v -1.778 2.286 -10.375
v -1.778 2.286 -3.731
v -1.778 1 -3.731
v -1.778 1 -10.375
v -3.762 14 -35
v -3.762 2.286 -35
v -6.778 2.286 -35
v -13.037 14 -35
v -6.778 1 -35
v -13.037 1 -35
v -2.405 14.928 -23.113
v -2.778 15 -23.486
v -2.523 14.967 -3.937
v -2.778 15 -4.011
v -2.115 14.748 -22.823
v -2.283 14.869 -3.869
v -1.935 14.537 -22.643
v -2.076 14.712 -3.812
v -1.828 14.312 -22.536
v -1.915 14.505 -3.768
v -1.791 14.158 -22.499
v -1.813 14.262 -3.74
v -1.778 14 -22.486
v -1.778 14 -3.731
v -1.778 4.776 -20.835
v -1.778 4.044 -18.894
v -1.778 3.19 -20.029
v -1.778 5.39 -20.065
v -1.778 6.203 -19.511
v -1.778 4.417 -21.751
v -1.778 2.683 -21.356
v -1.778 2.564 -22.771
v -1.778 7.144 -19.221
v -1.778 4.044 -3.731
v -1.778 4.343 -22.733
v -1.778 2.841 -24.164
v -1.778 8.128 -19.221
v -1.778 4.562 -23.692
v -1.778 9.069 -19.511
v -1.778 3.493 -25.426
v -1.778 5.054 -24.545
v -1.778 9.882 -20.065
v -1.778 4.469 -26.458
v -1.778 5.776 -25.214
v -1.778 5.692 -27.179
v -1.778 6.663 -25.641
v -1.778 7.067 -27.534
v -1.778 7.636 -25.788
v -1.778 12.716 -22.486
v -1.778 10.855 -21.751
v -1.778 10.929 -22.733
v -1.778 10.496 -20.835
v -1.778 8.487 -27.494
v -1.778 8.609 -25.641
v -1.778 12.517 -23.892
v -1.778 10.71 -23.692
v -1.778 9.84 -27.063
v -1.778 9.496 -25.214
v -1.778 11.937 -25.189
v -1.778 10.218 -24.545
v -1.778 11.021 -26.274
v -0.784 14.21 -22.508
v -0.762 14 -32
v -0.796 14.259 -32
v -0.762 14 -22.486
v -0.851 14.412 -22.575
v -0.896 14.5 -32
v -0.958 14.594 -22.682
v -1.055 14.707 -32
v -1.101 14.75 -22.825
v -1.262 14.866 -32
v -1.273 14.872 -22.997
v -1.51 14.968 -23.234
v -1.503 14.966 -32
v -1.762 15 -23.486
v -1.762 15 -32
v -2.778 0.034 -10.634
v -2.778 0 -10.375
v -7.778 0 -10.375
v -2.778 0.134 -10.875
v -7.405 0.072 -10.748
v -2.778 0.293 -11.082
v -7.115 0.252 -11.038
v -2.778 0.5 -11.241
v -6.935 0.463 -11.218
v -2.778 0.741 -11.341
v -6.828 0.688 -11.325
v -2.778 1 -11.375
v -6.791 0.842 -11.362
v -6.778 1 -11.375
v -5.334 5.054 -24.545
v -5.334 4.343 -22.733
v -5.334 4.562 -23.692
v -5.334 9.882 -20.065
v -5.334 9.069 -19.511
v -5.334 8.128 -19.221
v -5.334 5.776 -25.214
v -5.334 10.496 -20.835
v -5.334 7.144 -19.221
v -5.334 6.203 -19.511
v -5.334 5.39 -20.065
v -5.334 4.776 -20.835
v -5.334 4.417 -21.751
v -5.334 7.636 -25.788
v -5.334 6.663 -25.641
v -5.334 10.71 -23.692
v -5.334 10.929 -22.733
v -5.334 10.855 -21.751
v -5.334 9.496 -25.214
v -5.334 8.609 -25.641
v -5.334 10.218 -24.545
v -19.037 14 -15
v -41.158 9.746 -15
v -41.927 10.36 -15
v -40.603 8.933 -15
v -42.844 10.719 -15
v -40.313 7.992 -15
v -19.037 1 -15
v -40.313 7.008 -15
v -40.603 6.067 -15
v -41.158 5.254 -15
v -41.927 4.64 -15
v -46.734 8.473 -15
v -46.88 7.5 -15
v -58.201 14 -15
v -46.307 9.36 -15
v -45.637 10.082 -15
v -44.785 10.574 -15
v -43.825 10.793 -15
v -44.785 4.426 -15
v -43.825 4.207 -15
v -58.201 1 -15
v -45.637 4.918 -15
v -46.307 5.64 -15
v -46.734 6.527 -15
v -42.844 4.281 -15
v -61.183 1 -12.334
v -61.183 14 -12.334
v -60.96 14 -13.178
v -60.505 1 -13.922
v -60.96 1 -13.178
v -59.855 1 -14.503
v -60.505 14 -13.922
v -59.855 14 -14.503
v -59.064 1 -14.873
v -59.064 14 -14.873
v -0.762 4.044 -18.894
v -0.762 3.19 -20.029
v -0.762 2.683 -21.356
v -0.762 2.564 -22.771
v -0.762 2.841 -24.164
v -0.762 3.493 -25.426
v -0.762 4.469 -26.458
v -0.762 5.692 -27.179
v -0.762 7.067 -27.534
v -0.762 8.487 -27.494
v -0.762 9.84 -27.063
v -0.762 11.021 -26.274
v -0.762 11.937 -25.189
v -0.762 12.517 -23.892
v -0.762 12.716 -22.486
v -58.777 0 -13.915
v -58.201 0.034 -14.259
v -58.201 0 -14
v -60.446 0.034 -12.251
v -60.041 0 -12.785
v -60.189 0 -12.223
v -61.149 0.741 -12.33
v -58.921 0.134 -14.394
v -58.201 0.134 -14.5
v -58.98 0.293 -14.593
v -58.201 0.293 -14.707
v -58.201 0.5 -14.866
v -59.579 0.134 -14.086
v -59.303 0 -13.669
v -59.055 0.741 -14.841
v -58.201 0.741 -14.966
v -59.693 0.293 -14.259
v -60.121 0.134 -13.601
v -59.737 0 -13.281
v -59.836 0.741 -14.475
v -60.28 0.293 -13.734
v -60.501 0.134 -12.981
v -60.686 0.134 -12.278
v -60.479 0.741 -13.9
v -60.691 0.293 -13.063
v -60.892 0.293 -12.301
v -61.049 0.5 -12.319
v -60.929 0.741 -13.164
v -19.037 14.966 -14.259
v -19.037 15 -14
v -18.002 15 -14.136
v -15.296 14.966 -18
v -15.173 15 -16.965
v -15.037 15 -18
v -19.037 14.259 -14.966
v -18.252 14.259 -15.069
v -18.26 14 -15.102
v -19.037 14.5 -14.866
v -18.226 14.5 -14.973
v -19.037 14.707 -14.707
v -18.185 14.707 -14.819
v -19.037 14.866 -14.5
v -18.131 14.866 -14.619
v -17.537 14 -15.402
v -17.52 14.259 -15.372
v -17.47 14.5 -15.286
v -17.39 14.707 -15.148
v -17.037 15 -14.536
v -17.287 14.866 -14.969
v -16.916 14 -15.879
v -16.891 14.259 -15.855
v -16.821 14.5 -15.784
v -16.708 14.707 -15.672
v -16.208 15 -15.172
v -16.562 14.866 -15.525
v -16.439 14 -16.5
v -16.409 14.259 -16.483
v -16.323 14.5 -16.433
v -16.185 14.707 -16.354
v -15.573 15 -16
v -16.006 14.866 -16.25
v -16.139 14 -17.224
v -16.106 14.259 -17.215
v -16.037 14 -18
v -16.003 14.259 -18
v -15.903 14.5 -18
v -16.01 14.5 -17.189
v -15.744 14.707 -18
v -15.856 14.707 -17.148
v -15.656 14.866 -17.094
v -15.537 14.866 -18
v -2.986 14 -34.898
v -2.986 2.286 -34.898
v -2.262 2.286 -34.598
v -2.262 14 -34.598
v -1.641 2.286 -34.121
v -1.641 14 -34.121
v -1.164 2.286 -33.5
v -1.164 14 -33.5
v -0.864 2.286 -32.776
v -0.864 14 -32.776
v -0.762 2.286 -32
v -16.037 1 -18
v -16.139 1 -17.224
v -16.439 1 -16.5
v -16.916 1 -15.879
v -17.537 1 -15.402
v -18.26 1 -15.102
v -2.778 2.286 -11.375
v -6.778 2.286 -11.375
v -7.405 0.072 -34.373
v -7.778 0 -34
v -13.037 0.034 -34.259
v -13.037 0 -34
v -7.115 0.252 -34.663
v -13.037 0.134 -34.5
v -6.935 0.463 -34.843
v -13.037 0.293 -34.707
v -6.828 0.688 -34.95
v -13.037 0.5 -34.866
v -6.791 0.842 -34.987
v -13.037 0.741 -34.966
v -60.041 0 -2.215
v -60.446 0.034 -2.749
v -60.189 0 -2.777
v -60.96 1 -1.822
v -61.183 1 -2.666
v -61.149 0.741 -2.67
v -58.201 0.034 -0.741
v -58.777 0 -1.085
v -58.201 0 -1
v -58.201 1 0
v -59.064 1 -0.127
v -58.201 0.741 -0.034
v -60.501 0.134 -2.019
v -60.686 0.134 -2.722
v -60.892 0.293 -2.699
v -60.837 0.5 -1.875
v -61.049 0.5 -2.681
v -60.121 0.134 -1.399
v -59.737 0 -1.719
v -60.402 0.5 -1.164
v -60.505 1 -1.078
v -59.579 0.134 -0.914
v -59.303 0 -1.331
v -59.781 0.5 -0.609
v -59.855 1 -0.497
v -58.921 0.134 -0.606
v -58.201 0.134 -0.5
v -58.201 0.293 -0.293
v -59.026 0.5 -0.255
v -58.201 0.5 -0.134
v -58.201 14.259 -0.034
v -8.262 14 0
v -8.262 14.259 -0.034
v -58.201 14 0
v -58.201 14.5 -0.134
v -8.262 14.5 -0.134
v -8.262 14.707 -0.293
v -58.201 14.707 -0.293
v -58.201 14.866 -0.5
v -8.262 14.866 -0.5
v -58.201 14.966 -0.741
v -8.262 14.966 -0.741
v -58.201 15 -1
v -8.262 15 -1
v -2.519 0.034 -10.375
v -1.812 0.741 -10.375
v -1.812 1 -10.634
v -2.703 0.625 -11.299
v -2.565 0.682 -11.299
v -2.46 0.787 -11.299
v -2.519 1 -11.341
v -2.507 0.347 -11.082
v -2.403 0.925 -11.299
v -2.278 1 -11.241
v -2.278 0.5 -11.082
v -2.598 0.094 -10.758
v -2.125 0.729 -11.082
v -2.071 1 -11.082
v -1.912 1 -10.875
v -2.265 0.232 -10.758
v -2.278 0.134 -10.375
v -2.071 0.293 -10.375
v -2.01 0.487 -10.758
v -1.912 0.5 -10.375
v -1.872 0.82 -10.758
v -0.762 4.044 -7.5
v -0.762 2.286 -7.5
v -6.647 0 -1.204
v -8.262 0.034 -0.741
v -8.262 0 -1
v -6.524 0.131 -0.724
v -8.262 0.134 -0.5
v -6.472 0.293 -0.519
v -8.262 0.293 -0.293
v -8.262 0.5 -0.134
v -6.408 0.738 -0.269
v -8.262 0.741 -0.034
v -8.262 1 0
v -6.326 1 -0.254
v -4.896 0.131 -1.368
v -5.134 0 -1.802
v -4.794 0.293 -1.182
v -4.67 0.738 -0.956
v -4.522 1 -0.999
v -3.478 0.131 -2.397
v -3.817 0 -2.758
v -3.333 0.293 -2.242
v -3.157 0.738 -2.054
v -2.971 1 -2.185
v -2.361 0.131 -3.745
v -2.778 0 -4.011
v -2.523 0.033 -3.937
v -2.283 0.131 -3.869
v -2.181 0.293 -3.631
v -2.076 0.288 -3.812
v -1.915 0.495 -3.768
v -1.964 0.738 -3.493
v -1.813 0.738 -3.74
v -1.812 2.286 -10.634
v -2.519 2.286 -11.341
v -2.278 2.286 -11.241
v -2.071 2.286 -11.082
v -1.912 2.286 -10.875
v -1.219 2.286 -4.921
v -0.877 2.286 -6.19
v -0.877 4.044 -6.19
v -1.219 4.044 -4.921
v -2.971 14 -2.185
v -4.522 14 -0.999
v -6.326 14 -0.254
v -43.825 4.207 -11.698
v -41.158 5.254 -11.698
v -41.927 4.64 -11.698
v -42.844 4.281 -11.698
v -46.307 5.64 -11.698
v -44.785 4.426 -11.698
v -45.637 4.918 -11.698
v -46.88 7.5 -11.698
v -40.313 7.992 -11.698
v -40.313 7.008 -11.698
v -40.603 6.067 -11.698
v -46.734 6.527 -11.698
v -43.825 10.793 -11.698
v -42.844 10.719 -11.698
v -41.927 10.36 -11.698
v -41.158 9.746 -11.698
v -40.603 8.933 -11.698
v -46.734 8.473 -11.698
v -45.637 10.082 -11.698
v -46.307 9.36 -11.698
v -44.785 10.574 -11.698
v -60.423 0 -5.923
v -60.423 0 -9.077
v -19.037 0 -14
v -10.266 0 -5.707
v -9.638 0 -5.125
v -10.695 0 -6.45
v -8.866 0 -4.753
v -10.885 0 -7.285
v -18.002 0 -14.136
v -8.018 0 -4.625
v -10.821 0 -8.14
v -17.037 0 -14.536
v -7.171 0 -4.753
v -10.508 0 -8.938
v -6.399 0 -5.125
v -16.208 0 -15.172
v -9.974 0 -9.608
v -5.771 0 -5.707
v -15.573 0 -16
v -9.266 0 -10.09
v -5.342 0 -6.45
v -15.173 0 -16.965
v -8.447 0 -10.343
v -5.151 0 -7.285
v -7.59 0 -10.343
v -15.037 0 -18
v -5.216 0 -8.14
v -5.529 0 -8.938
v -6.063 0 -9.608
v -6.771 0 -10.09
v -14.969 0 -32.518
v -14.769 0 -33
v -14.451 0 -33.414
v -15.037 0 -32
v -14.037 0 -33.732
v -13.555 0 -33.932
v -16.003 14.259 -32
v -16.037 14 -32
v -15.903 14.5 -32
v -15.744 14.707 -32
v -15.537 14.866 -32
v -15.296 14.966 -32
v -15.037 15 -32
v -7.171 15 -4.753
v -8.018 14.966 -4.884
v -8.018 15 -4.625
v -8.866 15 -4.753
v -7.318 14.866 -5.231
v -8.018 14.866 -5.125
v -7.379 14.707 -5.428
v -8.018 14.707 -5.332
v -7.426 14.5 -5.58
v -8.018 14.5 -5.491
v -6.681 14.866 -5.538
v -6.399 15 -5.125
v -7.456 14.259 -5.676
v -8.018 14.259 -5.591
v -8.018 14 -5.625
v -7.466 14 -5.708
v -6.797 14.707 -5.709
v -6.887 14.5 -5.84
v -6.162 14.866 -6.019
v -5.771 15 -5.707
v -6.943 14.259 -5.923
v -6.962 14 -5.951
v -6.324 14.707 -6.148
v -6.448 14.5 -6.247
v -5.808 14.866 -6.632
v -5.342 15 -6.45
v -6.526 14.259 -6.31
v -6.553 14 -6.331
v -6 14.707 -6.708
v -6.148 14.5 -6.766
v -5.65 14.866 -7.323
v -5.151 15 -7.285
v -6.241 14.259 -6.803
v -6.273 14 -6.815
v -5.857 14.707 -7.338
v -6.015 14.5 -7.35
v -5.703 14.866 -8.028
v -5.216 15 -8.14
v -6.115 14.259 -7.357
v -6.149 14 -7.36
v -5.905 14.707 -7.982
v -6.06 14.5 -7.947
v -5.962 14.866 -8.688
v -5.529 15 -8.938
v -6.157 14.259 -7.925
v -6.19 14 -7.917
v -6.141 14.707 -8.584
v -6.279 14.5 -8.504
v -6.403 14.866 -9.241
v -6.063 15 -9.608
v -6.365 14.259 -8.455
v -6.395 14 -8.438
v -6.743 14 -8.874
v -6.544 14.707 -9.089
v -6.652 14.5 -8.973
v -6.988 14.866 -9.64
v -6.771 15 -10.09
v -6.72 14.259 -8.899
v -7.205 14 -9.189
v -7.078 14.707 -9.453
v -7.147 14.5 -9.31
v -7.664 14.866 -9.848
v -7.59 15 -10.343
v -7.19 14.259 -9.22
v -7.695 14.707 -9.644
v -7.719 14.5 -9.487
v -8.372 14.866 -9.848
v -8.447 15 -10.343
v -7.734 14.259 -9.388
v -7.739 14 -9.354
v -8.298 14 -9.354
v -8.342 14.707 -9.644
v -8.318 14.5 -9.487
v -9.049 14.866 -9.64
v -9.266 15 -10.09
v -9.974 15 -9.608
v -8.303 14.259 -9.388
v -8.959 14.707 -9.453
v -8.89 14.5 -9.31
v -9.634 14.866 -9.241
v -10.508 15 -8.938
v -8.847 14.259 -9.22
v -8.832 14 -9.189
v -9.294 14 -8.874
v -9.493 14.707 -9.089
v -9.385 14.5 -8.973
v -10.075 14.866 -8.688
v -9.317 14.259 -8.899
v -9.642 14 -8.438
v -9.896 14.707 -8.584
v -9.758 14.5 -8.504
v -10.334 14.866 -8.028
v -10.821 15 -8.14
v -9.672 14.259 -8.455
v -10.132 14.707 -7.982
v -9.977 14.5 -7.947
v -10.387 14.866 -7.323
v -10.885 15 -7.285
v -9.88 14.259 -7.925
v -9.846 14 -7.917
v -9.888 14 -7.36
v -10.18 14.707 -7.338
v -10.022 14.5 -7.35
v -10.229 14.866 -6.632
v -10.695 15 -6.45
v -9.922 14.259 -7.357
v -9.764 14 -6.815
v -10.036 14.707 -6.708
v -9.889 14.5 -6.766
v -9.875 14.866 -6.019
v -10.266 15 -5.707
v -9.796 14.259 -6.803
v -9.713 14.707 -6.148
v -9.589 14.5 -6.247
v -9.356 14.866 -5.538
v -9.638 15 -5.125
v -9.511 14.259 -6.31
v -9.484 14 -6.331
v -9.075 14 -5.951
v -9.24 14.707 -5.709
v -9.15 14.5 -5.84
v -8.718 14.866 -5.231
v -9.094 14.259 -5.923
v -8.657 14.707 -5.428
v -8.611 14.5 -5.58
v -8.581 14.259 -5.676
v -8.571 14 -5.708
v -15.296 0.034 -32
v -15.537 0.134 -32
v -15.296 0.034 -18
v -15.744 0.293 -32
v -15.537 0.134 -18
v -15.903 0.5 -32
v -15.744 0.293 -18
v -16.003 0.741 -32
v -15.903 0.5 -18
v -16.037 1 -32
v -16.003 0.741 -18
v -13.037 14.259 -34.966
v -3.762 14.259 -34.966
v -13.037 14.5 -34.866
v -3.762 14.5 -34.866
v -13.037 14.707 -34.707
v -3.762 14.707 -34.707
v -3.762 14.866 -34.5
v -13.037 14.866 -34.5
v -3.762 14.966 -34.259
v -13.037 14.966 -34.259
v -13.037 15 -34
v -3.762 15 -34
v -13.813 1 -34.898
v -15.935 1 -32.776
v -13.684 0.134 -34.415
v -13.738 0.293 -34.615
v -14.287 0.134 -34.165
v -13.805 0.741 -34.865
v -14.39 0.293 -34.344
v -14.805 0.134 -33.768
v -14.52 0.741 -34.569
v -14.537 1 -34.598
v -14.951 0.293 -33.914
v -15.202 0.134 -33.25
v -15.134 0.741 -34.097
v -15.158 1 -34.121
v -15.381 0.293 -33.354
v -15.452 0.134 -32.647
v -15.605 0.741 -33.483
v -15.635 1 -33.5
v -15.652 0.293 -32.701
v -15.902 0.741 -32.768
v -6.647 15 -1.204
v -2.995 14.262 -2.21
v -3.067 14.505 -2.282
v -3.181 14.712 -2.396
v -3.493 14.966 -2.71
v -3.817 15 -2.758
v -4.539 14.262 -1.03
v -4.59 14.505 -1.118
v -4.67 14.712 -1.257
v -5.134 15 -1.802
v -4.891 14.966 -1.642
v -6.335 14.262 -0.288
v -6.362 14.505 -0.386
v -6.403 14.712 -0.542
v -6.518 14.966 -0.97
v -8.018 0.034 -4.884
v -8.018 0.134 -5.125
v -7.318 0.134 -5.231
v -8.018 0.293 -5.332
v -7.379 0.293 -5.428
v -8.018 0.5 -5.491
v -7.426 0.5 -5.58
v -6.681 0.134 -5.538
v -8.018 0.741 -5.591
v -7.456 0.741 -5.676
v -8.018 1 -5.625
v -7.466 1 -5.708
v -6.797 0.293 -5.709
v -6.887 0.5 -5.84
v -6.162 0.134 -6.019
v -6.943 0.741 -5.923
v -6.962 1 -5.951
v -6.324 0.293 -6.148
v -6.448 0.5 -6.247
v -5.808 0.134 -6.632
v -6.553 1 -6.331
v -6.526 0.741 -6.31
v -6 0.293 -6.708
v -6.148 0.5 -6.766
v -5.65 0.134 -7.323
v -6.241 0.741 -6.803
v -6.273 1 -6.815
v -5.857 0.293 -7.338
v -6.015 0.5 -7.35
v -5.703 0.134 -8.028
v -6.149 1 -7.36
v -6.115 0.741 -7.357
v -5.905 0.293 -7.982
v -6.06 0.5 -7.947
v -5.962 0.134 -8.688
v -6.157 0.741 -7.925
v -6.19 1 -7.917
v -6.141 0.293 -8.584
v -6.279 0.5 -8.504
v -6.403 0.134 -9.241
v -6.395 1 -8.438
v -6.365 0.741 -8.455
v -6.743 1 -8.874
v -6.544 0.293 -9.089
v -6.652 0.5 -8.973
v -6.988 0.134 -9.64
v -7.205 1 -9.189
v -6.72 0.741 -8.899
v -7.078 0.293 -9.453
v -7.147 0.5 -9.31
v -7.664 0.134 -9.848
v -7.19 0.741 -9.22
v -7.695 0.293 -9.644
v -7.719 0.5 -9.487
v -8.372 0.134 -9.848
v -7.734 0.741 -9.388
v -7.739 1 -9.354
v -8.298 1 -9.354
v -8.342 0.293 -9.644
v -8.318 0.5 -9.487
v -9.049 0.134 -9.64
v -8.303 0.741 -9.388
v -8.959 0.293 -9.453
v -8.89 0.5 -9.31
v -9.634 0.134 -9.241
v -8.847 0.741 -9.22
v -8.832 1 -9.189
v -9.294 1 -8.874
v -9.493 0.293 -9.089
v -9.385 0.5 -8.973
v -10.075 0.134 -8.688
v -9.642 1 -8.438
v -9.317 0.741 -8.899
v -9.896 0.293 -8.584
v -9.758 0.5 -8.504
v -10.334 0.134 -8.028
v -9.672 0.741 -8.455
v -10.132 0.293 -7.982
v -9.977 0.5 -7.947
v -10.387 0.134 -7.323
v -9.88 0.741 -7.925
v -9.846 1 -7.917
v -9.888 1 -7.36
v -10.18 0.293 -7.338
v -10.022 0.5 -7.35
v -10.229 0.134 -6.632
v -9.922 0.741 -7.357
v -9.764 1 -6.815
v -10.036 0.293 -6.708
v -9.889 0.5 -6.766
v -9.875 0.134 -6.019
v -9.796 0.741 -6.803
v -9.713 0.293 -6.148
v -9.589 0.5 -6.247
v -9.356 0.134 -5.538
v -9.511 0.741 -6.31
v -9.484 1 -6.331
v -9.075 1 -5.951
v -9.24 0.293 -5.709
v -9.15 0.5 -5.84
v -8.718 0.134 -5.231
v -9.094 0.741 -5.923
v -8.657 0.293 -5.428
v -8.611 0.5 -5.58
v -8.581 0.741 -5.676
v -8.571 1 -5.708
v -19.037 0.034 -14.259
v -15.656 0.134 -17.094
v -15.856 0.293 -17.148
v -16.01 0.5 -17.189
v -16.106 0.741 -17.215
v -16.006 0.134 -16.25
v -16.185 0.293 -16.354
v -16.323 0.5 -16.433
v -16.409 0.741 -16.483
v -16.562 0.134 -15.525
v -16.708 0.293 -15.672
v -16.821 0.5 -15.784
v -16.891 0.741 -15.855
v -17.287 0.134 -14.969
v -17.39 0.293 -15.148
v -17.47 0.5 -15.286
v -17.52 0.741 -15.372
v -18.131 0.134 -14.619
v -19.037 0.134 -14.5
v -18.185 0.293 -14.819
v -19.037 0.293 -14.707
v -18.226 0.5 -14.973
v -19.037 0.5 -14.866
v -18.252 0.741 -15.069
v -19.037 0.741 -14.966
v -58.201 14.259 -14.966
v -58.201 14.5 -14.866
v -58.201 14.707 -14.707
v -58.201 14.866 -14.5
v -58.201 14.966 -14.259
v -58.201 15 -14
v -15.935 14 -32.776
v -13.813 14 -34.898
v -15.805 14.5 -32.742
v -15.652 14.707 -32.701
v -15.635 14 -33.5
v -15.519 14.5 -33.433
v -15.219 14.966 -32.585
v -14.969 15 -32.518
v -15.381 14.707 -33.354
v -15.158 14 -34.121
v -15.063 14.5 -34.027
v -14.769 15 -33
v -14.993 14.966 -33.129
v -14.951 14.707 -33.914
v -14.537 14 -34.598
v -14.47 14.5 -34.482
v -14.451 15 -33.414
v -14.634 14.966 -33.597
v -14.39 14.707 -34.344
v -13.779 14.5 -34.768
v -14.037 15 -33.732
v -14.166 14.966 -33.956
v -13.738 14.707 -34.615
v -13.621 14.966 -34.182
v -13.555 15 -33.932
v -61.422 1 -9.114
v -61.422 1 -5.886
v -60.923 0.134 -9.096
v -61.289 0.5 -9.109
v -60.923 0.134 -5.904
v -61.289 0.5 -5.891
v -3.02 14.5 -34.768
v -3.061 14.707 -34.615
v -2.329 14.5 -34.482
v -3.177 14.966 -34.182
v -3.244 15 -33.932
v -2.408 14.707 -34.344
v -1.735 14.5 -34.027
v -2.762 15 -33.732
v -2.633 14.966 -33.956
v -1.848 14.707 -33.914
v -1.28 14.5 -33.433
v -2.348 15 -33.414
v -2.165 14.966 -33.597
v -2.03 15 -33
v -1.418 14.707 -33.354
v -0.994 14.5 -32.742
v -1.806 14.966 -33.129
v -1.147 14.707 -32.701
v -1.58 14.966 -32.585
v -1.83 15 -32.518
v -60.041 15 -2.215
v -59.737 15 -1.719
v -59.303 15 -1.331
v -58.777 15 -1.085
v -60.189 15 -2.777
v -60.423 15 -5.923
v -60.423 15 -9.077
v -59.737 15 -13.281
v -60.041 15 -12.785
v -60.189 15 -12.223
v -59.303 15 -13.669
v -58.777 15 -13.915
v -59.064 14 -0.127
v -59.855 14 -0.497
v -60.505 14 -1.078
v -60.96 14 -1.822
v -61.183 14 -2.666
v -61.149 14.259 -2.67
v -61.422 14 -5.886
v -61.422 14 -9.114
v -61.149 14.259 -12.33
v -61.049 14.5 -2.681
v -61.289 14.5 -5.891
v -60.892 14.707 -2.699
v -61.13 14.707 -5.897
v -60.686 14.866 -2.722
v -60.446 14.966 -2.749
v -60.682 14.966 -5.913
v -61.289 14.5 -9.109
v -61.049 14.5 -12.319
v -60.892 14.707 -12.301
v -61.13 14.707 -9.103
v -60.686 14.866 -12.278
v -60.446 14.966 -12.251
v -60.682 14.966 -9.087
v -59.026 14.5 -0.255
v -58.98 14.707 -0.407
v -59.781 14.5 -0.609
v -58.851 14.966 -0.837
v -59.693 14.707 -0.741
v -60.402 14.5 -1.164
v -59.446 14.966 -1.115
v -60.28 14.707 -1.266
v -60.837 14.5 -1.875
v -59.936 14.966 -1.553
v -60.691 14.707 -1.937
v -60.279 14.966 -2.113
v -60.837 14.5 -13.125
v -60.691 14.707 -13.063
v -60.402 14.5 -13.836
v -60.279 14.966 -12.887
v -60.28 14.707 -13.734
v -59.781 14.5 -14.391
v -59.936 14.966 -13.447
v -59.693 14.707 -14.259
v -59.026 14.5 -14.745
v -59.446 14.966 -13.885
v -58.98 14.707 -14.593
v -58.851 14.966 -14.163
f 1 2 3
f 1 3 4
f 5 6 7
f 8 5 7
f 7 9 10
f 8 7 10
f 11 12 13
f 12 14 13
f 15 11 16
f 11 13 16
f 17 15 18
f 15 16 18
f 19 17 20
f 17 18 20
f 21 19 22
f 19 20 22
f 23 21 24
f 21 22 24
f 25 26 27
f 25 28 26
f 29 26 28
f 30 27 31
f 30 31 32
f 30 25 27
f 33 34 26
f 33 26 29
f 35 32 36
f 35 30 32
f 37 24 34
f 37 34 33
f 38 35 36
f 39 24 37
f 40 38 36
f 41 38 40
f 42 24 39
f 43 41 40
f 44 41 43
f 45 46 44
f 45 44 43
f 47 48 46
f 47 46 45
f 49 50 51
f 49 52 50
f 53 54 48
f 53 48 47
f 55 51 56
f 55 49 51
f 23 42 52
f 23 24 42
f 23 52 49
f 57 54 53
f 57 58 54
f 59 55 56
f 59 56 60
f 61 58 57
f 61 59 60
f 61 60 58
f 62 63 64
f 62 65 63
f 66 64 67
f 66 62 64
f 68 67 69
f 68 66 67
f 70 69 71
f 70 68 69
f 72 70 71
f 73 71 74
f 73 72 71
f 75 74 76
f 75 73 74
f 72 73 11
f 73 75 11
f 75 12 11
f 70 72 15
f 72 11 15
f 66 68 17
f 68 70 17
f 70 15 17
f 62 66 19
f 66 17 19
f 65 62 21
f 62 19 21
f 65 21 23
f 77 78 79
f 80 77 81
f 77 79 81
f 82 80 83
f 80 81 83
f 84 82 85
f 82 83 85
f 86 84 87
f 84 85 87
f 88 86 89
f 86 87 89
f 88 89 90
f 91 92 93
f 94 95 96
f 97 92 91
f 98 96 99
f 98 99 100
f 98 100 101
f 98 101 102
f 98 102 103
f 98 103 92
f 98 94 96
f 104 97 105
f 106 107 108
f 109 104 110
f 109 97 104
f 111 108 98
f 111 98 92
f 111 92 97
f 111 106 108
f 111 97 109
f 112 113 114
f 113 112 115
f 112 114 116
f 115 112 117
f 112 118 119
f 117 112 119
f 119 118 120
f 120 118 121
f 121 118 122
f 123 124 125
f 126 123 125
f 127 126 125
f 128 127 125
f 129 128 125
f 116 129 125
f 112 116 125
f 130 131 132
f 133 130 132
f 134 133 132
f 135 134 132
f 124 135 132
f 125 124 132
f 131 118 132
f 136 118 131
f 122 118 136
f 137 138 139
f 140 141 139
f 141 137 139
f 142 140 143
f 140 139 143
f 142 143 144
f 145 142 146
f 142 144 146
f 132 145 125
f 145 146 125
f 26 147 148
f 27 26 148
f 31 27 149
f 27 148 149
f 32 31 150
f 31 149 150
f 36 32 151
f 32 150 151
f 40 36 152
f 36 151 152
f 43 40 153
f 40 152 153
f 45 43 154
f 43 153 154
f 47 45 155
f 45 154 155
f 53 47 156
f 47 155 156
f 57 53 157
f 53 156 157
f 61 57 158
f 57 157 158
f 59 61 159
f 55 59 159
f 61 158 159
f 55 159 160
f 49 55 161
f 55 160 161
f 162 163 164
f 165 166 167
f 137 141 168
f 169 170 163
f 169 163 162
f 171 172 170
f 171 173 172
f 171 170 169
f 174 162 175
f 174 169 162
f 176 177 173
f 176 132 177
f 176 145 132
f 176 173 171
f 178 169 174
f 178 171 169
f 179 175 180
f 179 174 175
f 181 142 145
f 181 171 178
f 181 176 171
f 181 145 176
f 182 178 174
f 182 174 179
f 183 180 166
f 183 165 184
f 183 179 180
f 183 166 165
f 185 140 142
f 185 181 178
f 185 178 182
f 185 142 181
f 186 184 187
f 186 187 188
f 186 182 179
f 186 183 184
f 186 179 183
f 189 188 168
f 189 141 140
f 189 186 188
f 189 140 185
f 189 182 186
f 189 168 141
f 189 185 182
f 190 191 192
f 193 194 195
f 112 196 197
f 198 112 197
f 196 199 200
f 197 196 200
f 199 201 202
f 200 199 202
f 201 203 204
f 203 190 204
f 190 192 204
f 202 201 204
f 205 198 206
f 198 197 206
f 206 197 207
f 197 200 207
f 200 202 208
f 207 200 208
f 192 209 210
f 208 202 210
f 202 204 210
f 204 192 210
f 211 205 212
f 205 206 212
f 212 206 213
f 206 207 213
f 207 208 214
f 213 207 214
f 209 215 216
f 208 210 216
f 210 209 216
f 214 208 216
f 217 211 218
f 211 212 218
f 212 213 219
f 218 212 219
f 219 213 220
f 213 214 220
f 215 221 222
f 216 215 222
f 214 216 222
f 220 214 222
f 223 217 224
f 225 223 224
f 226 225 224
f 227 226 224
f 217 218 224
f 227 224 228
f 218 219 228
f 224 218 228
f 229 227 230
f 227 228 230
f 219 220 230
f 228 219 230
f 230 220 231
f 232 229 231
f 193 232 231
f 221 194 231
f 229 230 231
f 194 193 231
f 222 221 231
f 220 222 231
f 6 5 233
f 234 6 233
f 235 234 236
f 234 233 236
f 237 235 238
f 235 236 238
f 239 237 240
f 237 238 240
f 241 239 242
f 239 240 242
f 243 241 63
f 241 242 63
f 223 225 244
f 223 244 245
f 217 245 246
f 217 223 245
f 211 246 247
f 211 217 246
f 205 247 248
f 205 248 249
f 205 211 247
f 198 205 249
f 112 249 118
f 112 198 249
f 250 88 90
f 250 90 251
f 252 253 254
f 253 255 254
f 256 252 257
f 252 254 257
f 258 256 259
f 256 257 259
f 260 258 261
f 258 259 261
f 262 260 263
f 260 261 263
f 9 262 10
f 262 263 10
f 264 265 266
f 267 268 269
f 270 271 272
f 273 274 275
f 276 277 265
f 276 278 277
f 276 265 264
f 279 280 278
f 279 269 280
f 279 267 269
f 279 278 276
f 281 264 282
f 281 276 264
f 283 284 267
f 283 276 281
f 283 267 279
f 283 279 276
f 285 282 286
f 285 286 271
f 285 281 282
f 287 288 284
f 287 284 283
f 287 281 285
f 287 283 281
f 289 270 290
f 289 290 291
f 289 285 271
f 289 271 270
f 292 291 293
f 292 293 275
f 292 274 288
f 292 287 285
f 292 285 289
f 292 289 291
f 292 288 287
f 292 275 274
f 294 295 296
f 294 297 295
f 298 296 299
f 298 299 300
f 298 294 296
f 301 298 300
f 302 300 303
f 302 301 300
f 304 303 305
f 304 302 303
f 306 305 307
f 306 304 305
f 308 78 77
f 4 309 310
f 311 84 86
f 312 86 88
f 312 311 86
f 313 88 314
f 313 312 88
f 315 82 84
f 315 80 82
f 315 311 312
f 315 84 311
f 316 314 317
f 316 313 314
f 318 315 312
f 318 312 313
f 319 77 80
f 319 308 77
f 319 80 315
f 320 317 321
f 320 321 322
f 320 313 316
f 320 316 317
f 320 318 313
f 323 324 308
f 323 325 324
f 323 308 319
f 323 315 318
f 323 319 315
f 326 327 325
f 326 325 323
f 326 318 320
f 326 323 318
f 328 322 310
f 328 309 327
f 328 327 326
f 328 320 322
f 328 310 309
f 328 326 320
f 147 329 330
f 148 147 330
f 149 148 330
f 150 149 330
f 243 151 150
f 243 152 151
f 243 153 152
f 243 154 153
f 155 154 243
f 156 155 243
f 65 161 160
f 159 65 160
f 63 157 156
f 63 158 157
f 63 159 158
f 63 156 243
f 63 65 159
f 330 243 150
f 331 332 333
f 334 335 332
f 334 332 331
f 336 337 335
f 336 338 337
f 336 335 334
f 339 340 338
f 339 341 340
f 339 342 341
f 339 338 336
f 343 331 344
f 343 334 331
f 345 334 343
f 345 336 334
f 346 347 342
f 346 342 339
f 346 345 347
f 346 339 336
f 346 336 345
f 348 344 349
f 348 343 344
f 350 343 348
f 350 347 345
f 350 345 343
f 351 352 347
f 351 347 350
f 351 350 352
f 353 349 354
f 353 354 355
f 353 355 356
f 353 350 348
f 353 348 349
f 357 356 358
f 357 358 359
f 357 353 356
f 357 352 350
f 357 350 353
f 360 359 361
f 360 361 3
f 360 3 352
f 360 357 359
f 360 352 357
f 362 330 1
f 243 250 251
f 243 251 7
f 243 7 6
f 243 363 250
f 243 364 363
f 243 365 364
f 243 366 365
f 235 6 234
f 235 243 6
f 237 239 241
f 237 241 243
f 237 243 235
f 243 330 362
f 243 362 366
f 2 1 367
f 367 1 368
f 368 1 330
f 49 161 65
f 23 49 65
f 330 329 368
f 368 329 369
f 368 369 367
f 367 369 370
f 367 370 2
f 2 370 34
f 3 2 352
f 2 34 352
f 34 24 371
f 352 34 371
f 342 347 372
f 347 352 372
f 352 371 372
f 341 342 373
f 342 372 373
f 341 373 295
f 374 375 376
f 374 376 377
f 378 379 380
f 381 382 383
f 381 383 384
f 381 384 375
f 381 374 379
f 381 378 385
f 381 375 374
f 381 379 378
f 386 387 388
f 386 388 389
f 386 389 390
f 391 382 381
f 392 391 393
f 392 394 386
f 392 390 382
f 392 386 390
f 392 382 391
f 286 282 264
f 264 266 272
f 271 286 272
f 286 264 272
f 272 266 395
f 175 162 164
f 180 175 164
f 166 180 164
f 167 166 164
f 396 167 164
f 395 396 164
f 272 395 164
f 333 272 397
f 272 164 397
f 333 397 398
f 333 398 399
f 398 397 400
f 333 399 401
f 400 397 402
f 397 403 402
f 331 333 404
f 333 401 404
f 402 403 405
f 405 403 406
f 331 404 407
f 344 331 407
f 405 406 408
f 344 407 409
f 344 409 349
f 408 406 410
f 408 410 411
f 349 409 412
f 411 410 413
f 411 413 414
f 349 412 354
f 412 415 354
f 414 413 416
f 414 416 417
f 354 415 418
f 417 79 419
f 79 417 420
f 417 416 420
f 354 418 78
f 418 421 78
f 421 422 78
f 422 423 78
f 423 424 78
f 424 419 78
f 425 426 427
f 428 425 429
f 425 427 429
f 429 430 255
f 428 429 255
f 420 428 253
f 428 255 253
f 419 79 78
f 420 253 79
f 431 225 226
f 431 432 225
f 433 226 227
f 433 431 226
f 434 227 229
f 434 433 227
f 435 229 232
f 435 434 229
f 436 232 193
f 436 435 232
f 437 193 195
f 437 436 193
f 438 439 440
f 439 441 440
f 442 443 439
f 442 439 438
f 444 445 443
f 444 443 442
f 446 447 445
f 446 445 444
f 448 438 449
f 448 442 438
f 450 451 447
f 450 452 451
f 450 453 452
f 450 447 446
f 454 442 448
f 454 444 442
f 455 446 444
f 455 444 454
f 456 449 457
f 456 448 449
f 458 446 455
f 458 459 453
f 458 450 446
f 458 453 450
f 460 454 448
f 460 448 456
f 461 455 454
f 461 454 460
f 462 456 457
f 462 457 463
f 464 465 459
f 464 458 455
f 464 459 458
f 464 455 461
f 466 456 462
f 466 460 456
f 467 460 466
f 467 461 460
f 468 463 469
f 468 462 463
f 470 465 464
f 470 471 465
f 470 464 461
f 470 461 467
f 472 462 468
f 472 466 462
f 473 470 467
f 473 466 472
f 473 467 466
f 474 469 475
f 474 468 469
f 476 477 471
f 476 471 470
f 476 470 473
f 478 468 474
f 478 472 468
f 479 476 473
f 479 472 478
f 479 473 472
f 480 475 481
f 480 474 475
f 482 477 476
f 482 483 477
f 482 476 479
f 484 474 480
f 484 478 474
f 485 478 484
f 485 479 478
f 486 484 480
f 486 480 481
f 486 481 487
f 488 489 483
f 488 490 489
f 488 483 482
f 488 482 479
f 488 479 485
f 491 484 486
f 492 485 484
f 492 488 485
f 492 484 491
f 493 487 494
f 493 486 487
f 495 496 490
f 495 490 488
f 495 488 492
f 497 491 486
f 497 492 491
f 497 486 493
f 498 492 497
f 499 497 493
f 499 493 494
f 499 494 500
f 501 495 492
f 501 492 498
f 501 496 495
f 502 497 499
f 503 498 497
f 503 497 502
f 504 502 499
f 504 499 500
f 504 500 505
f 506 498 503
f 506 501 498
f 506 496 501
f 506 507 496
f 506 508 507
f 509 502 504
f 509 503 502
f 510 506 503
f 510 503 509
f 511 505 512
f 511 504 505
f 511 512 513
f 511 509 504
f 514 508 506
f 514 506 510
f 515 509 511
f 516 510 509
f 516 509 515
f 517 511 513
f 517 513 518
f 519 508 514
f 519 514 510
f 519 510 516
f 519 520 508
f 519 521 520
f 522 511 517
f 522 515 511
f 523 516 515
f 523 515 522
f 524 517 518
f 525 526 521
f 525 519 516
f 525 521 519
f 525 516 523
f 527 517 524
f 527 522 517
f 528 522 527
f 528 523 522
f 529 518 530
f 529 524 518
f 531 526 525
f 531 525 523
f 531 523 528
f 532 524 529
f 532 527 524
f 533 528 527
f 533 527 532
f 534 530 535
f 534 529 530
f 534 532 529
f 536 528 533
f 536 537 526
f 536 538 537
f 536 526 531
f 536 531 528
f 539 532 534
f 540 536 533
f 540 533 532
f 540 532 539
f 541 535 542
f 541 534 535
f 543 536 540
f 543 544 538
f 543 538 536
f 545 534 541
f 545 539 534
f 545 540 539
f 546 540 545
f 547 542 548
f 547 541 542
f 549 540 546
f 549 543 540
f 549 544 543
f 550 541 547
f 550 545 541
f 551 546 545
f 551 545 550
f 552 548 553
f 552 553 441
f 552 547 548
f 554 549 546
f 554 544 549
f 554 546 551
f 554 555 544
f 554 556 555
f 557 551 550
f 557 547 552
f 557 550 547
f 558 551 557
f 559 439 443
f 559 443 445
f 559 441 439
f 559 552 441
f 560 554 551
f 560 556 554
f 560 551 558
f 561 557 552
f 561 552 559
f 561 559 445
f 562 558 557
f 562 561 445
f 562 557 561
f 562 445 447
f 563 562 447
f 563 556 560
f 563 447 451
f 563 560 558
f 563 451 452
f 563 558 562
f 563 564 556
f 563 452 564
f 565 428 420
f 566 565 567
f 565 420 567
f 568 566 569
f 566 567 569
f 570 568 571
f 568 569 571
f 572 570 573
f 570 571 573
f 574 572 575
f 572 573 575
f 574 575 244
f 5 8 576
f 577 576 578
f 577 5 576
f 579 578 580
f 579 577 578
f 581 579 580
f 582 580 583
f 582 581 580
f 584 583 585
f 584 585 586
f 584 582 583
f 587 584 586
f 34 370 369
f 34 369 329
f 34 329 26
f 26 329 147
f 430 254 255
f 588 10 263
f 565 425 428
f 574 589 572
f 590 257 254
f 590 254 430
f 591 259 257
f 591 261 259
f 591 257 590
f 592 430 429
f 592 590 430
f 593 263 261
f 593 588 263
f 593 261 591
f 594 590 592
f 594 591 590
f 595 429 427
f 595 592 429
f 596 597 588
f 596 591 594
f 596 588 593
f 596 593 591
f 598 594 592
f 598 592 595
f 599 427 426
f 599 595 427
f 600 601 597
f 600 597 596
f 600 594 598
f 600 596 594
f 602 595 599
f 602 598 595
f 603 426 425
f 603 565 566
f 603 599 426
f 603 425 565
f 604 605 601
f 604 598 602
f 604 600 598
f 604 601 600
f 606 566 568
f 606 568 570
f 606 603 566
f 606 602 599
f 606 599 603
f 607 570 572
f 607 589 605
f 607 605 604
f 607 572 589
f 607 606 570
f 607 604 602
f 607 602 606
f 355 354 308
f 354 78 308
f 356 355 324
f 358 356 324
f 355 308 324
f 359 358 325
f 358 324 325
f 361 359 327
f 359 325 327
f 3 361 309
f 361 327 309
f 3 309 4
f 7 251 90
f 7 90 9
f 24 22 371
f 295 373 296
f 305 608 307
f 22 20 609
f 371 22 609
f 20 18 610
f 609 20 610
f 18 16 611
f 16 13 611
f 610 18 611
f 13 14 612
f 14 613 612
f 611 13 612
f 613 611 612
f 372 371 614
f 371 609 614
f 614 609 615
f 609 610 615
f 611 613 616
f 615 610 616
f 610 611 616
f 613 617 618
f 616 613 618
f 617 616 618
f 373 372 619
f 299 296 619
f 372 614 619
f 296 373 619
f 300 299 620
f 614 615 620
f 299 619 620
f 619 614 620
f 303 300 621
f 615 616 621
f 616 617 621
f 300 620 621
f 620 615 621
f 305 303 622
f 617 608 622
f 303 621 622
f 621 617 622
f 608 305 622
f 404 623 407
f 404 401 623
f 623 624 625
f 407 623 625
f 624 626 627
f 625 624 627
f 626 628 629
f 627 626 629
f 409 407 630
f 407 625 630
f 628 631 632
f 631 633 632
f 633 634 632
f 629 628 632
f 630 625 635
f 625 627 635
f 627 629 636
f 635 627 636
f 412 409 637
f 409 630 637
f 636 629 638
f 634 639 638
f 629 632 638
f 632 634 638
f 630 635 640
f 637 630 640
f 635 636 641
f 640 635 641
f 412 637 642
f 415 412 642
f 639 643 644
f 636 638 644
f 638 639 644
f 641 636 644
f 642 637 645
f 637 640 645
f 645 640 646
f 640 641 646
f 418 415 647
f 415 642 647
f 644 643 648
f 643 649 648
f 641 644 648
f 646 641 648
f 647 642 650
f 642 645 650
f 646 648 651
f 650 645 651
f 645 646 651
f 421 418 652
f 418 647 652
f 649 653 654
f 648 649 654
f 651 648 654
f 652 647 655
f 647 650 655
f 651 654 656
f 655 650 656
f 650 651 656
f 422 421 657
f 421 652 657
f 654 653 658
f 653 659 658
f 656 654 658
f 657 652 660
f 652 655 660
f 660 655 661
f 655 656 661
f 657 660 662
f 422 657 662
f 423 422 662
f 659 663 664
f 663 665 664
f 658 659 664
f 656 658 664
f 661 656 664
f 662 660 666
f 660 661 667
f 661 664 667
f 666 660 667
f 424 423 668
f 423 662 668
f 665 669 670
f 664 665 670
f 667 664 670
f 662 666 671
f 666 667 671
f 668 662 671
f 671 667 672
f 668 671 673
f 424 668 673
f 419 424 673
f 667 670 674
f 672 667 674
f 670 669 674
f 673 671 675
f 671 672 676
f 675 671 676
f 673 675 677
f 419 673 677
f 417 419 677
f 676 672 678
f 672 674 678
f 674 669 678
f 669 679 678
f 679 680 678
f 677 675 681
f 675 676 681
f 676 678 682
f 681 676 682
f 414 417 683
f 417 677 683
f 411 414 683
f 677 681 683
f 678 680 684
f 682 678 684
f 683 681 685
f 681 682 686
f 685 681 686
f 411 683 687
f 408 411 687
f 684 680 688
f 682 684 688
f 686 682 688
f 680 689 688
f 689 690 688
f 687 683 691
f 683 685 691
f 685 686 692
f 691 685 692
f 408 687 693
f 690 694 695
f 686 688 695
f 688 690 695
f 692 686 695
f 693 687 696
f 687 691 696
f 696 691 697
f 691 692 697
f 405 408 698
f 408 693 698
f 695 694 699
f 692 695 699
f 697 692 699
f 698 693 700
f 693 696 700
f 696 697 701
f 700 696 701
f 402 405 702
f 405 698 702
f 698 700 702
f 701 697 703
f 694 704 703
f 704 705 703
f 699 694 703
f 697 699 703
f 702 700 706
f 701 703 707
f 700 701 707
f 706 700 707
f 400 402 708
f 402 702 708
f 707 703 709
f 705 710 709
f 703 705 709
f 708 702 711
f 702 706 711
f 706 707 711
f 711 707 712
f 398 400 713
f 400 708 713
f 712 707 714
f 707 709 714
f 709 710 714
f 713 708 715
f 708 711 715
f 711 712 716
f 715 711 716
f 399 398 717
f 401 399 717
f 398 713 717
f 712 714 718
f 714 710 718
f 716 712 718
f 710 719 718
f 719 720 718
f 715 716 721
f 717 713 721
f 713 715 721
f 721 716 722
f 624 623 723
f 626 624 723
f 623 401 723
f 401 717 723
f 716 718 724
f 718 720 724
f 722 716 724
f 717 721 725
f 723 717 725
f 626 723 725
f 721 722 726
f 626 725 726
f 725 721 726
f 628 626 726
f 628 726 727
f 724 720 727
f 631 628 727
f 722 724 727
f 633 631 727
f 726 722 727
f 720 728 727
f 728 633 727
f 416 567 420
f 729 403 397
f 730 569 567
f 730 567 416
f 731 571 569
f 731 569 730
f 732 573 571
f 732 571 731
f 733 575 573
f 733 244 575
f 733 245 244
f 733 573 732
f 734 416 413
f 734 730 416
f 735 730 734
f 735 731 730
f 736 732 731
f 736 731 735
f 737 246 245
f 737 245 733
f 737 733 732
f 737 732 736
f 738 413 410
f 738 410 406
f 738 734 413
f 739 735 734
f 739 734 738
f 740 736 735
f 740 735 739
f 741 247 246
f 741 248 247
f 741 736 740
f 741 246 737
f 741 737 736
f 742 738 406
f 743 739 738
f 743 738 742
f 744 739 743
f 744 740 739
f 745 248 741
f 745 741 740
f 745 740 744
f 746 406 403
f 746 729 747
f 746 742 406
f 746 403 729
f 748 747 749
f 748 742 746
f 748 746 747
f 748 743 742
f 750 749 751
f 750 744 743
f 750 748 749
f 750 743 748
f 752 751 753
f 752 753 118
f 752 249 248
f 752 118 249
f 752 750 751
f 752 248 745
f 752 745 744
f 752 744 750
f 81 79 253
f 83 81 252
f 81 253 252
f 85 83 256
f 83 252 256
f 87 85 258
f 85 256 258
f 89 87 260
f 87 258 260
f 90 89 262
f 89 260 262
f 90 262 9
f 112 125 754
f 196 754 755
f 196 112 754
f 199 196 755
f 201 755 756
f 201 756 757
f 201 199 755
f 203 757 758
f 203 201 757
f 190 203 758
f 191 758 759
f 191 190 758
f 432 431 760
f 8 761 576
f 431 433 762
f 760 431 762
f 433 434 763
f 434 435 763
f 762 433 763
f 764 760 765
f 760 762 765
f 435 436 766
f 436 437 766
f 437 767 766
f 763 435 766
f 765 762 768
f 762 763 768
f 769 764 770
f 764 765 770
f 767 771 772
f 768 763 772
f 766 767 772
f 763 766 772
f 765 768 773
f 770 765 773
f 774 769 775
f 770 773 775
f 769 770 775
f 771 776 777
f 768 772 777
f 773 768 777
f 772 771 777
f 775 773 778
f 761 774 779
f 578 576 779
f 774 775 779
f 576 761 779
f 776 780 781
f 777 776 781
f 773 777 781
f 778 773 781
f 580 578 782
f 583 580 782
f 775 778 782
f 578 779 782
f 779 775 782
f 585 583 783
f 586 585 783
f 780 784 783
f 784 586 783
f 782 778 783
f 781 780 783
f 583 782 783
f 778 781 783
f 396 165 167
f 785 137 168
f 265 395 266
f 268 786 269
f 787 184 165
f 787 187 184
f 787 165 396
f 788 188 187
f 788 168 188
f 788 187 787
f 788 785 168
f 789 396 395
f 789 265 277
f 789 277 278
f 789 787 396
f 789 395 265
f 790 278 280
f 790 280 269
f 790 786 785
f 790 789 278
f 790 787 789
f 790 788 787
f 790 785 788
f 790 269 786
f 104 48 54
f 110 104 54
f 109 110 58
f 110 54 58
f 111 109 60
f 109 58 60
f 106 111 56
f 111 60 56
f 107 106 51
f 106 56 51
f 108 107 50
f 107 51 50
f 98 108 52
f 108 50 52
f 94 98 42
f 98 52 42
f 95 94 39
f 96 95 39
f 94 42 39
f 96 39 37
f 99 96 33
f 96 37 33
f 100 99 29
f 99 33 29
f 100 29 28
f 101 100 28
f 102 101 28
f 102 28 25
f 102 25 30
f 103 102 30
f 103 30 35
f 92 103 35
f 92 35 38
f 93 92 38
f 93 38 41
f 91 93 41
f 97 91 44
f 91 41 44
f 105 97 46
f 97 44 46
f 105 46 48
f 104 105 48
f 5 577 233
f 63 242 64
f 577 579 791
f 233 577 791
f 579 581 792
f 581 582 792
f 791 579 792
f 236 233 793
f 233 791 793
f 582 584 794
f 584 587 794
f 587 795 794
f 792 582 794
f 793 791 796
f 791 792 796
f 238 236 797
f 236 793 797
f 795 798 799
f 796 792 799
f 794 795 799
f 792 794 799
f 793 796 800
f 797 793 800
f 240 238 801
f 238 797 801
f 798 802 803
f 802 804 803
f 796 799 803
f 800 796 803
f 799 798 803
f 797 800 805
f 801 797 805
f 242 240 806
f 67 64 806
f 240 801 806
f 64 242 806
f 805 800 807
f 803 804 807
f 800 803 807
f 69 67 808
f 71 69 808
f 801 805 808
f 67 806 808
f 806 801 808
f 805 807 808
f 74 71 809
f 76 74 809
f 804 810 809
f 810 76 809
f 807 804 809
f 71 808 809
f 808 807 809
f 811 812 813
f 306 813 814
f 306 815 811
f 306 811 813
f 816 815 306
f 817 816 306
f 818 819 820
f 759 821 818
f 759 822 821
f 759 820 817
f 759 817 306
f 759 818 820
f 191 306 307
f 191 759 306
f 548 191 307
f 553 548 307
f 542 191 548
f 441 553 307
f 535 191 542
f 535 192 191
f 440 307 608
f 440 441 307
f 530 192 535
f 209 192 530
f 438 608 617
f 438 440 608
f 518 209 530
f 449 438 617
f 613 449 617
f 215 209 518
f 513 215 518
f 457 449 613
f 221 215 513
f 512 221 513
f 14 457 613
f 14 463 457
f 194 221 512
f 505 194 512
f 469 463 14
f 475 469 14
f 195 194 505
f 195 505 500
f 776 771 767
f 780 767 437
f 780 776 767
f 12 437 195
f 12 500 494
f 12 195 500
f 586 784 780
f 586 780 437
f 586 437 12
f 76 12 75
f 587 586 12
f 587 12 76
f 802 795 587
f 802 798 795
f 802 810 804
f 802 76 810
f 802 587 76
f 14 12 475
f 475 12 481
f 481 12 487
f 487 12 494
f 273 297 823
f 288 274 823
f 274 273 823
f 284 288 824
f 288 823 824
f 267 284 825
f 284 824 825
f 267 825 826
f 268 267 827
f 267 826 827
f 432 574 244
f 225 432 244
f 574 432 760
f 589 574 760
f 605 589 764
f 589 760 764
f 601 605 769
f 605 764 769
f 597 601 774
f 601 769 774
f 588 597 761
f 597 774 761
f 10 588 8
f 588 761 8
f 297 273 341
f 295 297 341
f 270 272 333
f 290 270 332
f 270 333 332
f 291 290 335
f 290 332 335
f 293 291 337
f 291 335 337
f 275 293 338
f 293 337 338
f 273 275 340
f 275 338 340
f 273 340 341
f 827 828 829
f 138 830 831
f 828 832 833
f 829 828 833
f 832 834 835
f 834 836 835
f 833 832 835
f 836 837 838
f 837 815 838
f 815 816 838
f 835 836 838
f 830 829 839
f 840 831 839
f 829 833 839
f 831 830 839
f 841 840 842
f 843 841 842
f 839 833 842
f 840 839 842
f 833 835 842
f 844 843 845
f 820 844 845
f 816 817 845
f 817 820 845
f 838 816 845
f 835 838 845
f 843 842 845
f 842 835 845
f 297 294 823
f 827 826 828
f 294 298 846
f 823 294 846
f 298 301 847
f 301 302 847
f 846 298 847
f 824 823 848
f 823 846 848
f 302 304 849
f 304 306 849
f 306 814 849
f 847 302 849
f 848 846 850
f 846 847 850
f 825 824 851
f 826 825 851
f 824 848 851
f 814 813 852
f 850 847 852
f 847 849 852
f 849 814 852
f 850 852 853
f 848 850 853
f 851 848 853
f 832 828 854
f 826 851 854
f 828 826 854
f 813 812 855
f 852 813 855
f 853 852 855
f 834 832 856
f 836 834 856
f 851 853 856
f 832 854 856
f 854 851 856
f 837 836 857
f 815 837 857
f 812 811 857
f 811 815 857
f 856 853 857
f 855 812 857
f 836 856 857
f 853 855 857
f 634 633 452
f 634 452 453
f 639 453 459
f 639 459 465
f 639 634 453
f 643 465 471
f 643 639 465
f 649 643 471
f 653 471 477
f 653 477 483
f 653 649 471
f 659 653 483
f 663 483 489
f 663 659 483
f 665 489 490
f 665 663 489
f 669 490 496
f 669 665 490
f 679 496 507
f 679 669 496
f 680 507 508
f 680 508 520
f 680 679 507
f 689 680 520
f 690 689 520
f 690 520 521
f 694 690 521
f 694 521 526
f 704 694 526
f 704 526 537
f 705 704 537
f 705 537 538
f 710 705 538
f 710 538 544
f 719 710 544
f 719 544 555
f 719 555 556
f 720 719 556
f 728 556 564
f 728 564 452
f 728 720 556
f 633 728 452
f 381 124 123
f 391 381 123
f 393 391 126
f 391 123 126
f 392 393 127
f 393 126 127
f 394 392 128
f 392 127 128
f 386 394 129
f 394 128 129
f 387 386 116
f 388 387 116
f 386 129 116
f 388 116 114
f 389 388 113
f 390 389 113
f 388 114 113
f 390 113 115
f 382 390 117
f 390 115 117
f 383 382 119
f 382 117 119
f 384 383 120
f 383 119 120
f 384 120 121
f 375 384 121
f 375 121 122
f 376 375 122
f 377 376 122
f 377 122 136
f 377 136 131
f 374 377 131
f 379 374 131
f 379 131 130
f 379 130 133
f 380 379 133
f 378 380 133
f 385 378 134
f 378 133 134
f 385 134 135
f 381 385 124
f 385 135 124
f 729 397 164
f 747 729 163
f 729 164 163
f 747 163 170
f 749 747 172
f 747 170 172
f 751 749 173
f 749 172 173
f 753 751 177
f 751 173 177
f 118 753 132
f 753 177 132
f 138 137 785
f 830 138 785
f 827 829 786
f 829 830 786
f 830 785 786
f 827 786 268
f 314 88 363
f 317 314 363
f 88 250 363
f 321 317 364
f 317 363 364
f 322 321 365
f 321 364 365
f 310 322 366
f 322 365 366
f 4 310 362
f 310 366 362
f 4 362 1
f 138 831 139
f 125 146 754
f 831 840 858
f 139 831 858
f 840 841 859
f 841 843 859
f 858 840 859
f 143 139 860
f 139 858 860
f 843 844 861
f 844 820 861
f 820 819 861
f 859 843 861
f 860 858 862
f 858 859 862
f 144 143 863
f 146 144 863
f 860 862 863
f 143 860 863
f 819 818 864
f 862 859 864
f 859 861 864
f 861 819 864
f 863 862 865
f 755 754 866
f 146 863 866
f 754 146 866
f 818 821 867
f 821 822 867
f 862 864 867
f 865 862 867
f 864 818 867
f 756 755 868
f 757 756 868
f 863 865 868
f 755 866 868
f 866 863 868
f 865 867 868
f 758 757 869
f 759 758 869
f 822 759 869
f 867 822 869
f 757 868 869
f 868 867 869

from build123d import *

# Parameters (mm, degrees)
SKETCH1_R           = 1.875
BOSS_EXTRUDE1_DEPTH = 15
SKETCH2_W           = 35
SKETCH2_H           = 2.286
CUT_EXTRUDE1_DEPTH  = 1.778
SKETCH7_W           = 23.625
SKETCH7_H           = 2.286
CUT_EXTRUDE6_DEPTH  = 5
SKETCH3_R           = 3.302
CUT_EXTRUDE2_DEPTH  = 3.556
SKETCH4_R           = 3.302
CUT_EXTRUDE3_DEPTH  = 3.302
SKETCH5_W           = 35
SKETCH5_H           = 15
CUT_EXTRUDE4_DEPTH  = 0.762
CUT_EXTRUDE5_DEPTH  = 73.293856534
FILLET1_R           = 3
FILLET2_R           = 1


with BuildPart() as part:
    # Sketch1 → Boss-Extrude1 (new body)
    with BuildSketch(Plane(origin=(0, 0, 0), x_dir=(1, 0, 0), z_dir=(0, 1, 0))):
        with BuildLine():
            Line((-60.8, 0), (0, 0))
            Line((0, 0), (0, 35))
            Line((0, 35), (-16.036868781, 35))
            Line((-16.036868781, 35), (-16.036868781, 15))
            Line((-16.036868781, 15), (-60.8, 15))
            ThreePointArc((-60.8, 15), (-61.45243439, 7.5), (-60.8, 0))
        make_face()
        with Locations(Location((-8.01843439, 7.5, 0), (0, 0, 270))):
            Circle(SKETCH1_R, mode=Mode.SUBTRACT)
    extrude(amount=BOSS_EXTRUDE1_DEPTH)

    # Sketch2 → Cut-Extrude1 (cut)
    with BuildSketch(Plane(origin=(0, 0, 0), x_dir=(0, 0, -1), z_dir=(1, 0, 0))):
        with BuildLine():
            Line((22.486, 12.716), (22.486, 15))
            Line((22.486, 15), (0, 15))
            Line((0, 15), (0, 4.043897552))
            Line((0, 4.043897552), (18.893897552, 4.043897552))
            ThreePointArc((18.893897552, 4.043897552), (27.179308025, 5.691968164), (22.486, 12.716))
        make_face()
        with Locations((17.5, 1.143)):
            Rectangle(SKETCH2_W, SKETCH2_H)
    extrude(amount=-CUT_EXTRUDE1_DEPTH, mode=Mode.SUBTRACT)

    # Sketch7 → Cut-Extrude6 (cut)
    with BuildSketch(Plane(origin=(-1.778, 0, 0), x_dir=(0, 0, -1), z_dir=(1, 0, 0))):
        with Locations((23.1875, 1.143)):
            Rectangle(SKETCH7_W, SKETCH7_H)
    extrude(amount=-CUT_EXTRUDE6_DEPTH, mode=Mode.SUBTRACT)

    # Sketch3 → Cut-Extrude2 (cut)
    with BuildSketch(Plane(origin=(-1.778, 0, 0), x_dir=(0, 0, -1), z_dir=(1, 0, 0))):
        with Locations((22.486, 7.636)):
            Circle(SKETCH3_R)
    extrude(amount=-CUT_EXTRUDE2_DEPTH, mode=Mode.SUBTRACT)

    # Sketch4 → Cut-Extrude3 (cut)
    with BuildSketch(Plane(origin=(0, 0, -15), x_dir=(-1, 0, 0), z_dir=(0, 0, -1))):
        with Locations((43.57843439, 7.5)):
            Circle(SKETCH4_R)
    extrude(amount=-CUT_EXTRUDE3_DEPTH, mode=Mode.SUBTRACT)

    # Sketch5 → Cut-Extrude4 (cut)
    with BuildSketch(Plane(origin=(0, 0, 0), x_dir=(0, 0, -1), z_dir=(1, 0, 0))):
        with Locations((17.5, 7.5)):
            Rectangle(SKETCH5_W, SKETCH5_H)
    extrude(amount=-CUT_EXTRUDE4_DEPTH, mode=Mode.SUBTRACT)

    # Sketch6 → Cut-Extrude5 (cut, through all)
    with BuildSketch(Plane(origin=(0, 15, 0), x_dir=(1, 0, 0), z_dir=(0, 1, 0))):
        with BuildLine():
            Line((-8.262, 0), (-0.762, 0))
            Line((-0.762, 0), (-0.762, 7.5))
            ThreePointArc((-0.762, 7.5), (-2.958699141, 2.196699141), (-8.262, 0))
        make_face()
    extrude(amount=-CUT_EXTRUDE5_DEPTH, mode=Mode.SUBTRACT)

    # Fillet1
    fillet1_edges = [part.edges().sort_by_distance(p)[0] for p in [
        (-60.8, 7.5, 0),
        (-60.8, 7.5, -15),
        (-16.036868781, 7.5, -15),
        (-16.036868781, 7.5, -35),
        (-0.762, 8.643, -35),
    ]]
    fillet(fillet1_edges, radius=FILLET1_R)

    # Fillet2
    fillet2_edges = [part.edges().sort_by_distance(p)[0] for p in [
        (-1.778, 0, -7.552841941),
        (-4.521670528, 15, -0.99923578),
        (-4.521670528, 0, -0.99923578),
        (-61.45243439, 0, -7.5),
        (-61.45243439, 15, -7.5),
        (-33.231623045, 0, 0),
        (-38.619057435, 0, -15),
        (-16.036868781, 0, -25),
        (-15.158189125, 0, -34.121320344),
        (-60.201042042, 0, -0.763749534),
        (-60.201042042, 0, -14.236250466),
        (-38.619057435, 15, -15),
        (-0.762, 15, -27.243),
        (-8.39943439, 15, -35),
        (-16.036868781, 15, -25),
        (-33.231623045, 15, 0),
        (-15.158189125, 15, -34.121320344),
        (-1.640679656, 15, -34.121320344),
        (-60.201042042, 15, -0.763749534),
        (-60.201042042, 15, -14.236250466),
        (-16.915548437, 0, -15.878679656),
        (-16.915548437, 15, -15.878679656),
        (-8.01843439, 0, -9.375),
        (-8.01843439, 15, -9.375),
        (-1.778, 15, -13.108341941),
        (-1.27, 15, -22.486),
        (-9.90743439, 0, -35),
        (-4.278, 0, -11.375),
        (-6.778, 0, -23.1875),
        (-1.778, 1.143, -11.375),
    ]]
    fillet(fillet2_edges, radius=FILLET2_R)


solid = part.part
